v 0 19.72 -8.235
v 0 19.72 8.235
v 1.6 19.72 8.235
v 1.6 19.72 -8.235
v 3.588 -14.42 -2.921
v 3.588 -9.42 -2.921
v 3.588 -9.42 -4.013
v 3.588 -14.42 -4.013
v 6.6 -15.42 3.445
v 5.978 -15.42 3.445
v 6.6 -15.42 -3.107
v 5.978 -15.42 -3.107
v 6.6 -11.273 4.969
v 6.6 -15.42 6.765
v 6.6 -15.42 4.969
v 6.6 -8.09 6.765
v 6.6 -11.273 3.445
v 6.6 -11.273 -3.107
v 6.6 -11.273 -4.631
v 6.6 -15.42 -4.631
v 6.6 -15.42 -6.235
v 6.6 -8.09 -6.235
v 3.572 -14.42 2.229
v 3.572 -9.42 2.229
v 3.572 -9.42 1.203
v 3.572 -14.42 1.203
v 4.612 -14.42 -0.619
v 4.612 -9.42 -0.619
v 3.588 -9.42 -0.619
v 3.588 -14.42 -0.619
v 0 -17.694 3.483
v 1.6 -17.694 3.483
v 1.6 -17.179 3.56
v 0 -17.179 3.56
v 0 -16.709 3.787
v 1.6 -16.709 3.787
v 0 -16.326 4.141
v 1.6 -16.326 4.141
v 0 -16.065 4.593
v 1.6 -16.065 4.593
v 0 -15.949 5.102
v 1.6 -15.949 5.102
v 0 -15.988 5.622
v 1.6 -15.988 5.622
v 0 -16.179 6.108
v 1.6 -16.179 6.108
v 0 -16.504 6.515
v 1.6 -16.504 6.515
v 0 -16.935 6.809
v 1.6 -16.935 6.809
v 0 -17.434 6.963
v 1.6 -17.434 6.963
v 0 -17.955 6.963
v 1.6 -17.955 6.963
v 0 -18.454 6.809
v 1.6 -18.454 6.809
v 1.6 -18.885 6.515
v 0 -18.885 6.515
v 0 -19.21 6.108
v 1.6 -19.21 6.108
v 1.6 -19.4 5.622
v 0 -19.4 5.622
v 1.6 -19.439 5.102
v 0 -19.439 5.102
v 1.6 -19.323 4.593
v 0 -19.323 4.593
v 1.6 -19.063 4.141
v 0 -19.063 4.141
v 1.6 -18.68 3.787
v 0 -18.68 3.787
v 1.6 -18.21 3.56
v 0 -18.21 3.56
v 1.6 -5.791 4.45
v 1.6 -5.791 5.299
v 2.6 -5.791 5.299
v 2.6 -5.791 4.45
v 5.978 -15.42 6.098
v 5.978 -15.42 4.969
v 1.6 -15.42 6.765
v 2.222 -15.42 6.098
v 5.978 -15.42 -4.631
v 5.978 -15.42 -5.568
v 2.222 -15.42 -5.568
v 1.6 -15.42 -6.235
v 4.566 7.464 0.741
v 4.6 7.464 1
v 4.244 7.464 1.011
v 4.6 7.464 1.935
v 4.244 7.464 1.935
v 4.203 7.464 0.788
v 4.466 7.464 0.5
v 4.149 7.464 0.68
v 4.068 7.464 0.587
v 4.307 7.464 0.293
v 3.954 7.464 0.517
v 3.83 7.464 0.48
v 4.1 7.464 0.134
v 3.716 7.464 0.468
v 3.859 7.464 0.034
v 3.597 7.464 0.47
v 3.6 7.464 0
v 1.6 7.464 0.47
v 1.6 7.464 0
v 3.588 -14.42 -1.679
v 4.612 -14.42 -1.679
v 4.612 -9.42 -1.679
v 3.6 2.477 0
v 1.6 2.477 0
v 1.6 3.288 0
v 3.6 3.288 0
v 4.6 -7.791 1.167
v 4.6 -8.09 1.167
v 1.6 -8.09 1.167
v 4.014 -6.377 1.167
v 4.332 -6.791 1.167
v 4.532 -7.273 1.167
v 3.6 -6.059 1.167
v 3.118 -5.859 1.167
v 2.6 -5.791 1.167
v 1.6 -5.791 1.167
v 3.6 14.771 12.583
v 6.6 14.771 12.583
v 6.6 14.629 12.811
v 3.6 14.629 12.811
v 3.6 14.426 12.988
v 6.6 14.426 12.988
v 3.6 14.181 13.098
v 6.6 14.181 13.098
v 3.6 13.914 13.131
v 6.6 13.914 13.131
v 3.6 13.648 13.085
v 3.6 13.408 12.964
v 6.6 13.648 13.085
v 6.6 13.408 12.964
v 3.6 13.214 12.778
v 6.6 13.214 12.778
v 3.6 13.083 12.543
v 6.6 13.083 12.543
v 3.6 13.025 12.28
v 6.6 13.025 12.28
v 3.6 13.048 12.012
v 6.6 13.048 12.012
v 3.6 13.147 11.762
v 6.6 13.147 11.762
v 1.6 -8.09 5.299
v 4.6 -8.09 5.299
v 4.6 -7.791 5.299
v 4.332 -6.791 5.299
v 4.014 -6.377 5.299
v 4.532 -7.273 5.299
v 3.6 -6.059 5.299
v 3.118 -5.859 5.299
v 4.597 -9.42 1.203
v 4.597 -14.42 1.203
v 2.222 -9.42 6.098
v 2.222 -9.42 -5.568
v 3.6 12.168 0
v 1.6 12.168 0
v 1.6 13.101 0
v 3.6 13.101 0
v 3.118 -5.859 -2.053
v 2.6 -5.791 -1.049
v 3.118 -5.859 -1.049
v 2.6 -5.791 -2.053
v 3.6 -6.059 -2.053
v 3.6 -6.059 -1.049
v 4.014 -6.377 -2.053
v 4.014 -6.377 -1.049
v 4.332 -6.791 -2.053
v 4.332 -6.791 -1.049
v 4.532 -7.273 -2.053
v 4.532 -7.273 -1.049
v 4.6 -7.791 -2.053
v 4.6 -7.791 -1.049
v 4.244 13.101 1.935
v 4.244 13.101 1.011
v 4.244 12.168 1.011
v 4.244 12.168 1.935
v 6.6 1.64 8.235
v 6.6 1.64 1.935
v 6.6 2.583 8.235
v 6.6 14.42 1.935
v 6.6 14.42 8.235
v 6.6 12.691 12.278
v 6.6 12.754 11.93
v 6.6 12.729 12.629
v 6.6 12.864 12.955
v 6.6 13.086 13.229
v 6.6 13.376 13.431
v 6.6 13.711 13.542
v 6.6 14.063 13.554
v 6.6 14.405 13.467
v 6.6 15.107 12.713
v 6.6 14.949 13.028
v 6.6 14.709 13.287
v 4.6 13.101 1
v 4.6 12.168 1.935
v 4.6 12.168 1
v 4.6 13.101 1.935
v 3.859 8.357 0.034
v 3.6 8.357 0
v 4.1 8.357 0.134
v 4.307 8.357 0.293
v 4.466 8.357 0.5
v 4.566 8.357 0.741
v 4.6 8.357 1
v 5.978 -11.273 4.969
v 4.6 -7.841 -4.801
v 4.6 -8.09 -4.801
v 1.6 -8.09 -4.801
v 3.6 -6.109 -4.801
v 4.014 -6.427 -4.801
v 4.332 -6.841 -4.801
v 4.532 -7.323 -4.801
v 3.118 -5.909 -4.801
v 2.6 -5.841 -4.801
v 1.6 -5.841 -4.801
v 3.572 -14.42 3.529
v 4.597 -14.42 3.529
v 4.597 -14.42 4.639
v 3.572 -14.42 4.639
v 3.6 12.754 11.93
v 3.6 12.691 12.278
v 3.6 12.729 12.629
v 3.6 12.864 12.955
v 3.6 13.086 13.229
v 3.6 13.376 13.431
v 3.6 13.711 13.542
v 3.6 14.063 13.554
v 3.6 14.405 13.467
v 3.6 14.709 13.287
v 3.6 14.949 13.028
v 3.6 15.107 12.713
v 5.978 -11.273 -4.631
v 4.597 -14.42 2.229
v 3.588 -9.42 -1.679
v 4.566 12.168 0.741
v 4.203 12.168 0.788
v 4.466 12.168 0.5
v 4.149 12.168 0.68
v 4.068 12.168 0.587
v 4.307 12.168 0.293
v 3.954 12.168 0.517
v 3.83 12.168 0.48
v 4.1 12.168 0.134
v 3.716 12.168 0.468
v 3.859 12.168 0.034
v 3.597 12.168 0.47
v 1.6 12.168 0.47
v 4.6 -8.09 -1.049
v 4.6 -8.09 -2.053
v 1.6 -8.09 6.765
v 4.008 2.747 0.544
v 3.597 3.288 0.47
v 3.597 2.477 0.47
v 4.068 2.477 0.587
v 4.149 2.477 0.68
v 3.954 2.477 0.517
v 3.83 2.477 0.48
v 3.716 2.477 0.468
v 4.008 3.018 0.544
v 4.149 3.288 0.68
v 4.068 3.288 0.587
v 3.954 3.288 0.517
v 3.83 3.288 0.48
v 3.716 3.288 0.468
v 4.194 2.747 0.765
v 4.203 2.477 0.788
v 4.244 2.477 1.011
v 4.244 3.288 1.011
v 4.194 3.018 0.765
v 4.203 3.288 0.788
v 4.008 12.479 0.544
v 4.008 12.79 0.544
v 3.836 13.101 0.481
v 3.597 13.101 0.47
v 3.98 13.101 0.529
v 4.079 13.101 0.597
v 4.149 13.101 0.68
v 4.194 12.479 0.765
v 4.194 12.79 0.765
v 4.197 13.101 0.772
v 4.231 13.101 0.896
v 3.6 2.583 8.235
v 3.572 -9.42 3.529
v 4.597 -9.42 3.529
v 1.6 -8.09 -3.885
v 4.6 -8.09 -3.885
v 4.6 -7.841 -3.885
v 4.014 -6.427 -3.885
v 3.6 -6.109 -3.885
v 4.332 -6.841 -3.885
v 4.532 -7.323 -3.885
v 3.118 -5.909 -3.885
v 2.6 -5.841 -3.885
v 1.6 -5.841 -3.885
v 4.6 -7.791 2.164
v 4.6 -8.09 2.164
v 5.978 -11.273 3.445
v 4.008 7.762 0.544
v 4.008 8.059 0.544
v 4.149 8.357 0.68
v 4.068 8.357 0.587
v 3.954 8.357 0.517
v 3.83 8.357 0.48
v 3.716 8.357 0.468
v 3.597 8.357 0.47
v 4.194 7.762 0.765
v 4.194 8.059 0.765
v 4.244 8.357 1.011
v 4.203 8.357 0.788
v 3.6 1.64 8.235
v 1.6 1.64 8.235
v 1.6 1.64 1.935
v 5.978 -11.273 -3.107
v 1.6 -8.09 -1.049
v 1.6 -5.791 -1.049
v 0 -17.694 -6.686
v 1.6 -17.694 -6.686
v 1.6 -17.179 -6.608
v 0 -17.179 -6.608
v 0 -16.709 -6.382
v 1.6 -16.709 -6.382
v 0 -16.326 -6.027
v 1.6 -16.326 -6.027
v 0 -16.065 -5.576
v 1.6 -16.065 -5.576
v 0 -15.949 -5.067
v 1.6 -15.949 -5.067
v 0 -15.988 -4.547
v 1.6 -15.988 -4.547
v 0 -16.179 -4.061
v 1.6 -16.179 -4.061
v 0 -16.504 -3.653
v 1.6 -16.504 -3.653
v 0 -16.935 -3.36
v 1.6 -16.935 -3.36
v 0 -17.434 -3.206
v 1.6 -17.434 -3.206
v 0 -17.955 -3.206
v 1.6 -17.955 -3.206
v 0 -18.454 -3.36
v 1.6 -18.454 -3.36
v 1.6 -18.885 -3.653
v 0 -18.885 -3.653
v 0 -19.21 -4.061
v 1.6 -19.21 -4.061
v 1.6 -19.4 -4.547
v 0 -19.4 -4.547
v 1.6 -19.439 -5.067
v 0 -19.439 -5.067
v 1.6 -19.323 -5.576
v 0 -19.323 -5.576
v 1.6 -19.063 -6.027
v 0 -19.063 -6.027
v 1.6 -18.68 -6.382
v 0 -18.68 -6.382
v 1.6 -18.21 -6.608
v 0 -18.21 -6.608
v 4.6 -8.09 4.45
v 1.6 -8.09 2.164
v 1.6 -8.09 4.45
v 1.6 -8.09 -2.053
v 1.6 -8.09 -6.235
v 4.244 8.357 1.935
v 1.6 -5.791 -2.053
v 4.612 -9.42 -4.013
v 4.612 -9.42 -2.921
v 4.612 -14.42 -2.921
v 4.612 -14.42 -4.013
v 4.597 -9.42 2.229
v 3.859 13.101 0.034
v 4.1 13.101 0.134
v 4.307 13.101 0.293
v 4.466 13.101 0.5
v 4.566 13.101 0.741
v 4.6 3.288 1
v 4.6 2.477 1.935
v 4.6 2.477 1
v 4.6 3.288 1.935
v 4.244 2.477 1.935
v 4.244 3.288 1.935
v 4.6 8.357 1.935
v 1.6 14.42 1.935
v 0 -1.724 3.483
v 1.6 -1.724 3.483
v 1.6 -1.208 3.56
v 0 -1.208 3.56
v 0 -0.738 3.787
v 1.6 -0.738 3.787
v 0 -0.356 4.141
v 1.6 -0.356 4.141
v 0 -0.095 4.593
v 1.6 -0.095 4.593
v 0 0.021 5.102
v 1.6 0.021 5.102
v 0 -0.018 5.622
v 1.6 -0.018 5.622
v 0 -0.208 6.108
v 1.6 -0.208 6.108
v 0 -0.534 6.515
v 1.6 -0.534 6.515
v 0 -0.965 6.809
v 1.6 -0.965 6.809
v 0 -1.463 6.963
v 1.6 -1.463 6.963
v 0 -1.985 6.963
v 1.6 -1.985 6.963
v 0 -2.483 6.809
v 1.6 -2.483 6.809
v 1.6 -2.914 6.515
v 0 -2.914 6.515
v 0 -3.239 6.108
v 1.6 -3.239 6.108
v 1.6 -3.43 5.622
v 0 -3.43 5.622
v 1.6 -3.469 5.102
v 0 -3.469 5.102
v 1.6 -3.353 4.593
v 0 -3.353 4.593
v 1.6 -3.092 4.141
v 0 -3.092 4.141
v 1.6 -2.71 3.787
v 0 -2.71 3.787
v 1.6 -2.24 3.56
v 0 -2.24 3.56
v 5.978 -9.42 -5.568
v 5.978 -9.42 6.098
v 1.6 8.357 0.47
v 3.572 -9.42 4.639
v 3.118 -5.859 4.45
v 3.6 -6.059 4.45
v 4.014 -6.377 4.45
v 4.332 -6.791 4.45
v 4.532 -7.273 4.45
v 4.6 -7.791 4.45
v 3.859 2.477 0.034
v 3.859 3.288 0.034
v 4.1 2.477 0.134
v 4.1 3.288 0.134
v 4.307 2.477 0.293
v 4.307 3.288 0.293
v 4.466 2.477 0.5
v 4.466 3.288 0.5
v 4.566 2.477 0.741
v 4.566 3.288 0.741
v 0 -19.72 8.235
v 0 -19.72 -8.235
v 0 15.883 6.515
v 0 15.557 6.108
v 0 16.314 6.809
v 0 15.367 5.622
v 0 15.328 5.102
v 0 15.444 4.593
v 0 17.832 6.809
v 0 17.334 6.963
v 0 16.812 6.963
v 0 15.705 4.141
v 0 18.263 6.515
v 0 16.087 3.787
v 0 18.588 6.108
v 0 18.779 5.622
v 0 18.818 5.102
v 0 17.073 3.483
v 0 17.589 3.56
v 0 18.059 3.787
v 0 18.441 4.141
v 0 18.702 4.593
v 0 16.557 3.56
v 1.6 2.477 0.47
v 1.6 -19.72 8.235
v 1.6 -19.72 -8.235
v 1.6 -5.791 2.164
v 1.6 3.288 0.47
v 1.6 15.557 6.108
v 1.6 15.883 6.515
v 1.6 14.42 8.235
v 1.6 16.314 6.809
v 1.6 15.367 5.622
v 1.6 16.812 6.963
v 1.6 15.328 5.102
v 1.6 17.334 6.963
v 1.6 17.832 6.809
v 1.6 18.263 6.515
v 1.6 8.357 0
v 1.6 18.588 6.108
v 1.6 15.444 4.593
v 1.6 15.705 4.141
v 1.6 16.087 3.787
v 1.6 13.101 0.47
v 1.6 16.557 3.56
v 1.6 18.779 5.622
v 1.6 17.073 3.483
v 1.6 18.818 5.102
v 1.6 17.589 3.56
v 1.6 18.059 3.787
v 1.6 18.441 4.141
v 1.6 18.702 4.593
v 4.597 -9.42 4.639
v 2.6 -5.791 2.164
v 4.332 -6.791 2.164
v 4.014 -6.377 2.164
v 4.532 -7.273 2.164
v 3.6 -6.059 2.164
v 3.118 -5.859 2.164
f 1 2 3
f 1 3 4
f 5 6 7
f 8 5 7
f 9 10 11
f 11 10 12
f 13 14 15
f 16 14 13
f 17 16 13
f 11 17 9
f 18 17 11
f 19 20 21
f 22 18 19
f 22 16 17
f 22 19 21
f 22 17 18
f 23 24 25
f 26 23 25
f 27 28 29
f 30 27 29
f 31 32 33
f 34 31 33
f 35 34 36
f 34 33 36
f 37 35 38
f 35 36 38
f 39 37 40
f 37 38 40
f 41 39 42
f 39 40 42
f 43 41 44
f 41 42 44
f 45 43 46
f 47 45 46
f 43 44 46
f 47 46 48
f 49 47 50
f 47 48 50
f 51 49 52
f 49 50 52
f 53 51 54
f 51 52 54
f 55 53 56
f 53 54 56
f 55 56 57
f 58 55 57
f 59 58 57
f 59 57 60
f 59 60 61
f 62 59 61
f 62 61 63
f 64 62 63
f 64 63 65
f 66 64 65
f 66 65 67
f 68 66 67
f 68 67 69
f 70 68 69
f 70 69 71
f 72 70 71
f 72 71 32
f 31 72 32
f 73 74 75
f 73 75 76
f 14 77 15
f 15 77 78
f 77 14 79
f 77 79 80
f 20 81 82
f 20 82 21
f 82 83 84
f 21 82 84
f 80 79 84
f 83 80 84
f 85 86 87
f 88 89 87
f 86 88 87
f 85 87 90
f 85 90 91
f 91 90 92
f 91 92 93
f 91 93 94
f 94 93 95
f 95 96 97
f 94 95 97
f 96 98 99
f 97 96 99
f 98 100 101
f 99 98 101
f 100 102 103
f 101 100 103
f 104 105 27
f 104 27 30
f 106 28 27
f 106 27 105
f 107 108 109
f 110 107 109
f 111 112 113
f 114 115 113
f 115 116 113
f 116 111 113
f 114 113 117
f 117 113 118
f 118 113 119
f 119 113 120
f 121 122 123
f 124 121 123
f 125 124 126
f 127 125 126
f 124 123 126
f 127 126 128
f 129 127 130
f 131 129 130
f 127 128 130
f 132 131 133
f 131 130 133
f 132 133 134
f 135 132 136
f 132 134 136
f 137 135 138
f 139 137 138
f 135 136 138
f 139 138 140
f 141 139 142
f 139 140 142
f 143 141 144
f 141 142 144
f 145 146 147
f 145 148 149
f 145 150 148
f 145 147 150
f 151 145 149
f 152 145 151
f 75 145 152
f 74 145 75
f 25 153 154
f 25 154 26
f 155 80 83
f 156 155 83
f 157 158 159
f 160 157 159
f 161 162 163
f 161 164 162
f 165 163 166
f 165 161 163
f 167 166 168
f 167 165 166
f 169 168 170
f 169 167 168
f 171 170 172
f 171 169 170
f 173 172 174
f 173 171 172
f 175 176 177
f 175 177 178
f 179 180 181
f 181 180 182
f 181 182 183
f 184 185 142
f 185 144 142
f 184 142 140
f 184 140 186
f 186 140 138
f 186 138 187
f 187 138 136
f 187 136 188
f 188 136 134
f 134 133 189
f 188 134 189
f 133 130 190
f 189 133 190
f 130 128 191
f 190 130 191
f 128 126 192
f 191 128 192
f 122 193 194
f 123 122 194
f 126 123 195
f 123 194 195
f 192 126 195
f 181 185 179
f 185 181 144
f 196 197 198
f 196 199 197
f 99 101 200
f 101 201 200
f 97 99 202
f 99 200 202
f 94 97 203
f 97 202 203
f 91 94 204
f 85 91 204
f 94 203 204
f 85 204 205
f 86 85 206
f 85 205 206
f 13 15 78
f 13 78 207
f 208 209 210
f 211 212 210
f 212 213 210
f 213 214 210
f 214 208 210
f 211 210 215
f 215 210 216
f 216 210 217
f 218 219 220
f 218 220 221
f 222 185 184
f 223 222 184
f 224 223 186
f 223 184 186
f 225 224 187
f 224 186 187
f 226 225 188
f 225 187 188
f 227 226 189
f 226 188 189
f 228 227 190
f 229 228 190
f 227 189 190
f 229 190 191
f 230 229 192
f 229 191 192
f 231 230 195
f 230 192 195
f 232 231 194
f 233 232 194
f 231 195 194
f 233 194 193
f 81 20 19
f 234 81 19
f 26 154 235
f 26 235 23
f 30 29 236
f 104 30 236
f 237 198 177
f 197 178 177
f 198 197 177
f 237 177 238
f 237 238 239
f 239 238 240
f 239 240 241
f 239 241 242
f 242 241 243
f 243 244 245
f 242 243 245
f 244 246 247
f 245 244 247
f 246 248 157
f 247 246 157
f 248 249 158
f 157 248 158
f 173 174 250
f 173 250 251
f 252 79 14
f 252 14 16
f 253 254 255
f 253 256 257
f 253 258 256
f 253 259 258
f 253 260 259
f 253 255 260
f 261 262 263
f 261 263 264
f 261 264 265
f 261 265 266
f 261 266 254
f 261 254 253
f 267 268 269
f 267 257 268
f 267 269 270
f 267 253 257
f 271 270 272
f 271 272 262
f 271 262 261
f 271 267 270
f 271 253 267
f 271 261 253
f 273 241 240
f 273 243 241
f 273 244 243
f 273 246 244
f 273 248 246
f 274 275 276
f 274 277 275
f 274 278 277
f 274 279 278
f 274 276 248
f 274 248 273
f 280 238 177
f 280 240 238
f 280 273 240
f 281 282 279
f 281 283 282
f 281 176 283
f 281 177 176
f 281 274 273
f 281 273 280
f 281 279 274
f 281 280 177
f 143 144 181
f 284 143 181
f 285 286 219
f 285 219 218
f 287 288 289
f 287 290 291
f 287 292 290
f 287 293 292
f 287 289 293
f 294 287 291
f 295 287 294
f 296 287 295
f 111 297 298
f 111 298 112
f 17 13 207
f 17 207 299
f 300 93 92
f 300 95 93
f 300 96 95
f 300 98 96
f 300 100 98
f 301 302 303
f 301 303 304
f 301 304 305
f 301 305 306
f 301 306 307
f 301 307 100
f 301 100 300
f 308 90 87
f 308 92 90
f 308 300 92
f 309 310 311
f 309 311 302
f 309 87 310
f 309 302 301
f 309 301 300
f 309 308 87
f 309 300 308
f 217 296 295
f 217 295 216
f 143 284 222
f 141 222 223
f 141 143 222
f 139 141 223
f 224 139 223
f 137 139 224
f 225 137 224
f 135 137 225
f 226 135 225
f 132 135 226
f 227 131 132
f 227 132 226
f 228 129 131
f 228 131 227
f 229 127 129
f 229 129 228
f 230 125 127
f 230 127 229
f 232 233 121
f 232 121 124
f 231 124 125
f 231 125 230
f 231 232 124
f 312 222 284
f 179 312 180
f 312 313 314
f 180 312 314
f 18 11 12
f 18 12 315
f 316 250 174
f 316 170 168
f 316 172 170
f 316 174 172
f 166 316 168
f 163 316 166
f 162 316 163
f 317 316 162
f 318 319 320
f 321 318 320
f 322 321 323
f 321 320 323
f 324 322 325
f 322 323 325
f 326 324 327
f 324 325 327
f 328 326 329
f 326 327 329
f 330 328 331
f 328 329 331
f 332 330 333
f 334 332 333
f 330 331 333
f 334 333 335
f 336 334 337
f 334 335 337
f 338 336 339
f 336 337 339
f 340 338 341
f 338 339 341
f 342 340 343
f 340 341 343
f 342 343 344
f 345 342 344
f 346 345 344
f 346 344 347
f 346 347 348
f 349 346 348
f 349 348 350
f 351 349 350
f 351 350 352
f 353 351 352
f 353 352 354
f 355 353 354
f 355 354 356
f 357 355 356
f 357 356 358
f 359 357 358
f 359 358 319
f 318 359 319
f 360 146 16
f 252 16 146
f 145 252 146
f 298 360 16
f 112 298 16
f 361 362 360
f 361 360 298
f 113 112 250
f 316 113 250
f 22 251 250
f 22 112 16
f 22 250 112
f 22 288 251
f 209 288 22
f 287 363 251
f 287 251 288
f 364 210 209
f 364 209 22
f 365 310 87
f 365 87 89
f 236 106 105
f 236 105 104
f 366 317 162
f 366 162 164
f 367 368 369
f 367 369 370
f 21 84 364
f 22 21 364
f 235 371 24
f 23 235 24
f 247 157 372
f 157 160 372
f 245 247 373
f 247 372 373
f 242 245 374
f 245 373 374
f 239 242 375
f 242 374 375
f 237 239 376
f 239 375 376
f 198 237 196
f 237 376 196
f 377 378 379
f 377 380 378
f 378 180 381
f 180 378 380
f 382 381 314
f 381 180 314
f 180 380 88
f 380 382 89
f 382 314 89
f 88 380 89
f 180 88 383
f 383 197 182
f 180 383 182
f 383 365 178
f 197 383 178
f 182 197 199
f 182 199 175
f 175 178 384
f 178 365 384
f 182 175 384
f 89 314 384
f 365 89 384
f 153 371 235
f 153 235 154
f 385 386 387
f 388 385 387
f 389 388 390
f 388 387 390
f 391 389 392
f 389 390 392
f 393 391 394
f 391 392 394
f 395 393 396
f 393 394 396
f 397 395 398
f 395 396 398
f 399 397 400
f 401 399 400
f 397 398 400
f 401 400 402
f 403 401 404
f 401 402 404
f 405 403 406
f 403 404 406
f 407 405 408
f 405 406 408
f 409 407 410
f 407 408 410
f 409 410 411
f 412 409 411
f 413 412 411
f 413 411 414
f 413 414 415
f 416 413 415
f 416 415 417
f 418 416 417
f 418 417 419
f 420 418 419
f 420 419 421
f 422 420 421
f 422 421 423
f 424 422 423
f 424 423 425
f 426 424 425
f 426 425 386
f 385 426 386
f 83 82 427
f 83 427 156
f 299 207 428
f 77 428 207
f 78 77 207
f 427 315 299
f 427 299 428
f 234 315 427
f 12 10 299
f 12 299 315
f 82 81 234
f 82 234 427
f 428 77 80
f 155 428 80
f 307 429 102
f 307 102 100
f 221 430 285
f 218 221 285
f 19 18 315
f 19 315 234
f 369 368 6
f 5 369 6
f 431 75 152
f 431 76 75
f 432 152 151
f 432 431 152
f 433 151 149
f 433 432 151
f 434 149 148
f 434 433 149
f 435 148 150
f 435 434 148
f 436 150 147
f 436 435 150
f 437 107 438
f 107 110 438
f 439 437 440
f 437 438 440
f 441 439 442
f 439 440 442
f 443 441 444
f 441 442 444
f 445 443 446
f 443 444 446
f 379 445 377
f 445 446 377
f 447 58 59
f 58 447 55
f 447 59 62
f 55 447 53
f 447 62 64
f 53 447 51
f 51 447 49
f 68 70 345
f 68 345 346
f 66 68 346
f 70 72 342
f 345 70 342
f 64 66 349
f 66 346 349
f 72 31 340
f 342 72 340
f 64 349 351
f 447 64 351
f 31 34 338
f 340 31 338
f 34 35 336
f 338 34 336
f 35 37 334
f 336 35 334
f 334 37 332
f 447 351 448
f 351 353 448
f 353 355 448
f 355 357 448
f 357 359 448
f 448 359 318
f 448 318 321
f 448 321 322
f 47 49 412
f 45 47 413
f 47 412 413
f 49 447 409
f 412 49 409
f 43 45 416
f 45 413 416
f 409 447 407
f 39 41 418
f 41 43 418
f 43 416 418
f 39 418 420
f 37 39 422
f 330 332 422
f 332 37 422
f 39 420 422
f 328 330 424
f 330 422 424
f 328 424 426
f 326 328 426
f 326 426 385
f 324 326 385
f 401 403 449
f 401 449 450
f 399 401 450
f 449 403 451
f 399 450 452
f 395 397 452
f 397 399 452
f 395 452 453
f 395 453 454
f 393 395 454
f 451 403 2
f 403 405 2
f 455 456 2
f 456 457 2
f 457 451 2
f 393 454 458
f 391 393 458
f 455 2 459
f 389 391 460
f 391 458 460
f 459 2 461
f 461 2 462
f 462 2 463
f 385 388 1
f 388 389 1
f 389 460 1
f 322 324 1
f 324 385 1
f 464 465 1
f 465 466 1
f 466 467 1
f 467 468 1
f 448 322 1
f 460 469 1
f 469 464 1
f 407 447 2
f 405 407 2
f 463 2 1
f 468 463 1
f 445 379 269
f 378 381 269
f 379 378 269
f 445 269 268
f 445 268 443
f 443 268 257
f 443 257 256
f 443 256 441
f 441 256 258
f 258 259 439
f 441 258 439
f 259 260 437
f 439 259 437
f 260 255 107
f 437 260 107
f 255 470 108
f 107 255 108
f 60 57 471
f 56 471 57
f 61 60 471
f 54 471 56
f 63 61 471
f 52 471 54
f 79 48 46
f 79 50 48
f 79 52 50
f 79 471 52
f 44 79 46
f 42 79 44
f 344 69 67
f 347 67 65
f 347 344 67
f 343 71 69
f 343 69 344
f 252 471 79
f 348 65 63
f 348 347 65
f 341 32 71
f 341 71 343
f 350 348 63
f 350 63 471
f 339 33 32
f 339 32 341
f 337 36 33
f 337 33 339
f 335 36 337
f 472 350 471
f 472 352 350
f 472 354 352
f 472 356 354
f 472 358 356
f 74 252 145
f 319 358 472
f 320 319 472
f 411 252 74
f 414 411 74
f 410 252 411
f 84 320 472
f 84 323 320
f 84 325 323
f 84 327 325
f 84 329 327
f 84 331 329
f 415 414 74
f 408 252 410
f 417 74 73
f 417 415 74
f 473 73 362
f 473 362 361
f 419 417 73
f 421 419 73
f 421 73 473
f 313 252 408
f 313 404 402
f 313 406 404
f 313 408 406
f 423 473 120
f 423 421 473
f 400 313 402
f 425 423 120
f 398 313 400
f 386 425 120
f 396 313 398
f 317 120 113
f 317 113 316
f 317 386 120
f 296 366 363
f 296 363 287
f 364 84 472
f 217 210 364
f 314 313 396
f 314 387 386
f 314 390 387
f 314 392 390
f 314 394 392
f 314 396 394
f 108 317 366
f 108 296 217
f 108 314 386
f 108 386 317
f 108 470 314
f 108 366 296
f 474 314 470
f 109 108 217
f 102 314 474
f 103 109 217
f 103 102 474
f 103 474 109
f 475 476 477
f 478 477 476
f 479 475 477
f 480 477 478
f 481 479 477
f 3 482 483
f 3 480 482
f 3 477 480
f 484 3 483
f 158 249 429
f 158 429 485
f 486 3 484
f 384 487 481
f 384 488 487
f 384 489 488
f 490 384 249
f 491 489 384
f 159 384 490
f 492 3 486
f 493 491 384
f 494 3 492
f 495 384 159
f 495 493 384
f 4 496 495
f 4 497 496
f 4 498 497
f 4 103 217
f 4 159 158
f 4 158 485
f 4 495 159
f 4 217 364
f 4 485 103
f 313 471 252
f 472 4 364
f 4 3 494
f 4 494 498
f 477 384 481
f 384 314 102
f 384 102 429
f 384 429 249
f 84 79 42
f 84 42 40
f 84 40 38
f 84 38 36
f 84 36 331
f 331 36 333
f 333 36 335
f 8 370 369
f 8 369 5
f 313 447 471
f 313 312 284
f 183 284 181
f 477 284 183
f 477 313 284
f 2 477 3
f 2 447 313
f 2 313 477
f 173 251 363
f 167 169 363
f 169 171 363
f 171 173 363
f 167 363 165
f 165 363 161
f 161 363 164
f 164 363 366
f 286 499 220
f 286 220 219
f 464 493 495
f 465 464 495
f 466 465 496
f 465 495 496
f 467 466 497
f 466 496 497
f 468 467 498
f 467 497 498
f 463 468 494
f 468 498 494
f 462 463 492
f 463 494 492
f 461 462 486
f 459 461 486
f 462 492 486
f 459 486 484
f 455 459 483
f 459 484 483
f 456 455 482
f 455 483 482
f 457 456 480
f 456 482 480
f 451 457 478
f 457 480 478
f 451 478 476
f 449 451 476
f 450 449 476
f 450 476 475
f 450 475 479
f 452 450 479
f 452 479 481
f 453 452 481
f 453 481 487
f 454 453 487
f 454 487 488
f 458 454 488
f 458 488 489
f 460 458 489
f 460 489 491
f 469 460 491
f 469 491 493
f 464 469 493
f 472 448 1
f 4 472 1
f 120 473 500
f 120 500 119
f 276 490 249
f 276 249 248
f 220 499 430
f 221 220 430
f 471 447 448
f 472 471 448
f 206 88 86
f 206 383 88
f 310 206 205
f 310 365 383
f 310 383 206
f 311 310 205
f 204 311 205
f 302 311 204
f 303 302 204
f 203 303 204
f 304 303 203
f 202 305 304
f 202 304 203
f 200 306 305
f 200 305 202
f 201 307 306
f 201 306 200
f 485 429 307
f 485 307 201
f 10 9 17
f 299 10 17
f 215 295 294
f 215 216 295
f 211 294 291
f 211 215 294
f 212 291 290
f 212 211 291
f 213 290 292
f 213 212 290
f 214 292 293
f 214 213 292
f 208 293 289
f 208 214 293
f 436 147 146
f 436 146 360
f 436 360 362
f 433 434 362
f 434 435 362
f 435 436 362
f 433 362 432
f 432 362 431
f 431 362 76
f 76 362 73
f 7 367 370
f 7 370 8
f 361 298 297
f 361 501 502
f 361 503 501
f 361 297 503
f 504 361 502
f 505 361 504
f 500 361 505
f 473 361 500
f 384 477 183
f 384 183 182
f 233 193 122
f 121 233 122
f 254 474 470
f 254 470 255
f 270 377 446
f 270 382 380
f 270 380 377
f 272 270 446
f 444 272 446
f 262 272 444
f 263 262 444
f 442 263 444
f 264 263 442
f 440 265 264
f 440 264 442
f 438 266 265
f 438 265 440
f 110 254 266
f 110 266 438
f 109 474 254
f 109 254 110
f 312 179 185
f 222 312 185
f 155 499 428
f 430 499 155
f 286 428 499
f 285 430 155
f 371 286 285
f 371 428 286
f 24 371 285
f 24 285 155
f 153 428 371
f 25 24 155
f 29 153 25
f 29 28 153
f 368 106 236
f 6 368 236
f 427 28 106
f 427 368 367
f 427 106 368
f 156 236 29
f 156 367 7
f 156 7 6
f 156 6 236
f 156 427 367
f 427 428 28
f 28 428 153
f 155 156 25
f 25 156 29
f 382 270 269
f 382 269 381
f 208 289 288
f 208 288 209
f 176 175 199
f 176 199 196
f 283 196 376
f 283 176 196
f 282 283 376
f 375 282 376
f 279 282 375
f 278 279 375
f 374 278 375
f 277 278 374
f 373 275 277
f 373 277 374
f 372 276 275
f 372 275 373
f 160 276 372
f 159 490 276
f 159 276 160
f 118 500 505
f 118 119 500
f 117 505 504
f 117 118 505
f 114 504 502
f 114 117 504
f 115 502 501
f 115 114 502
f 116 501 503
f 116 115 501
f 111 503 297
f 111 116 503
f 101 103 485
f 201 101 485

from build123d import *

# Parameters (mm, degrees)
SKETCH1_W           = 16.47
SKETCH1_H           = 39.44
BOSS_EXTRUDE1_DEPTH = 1.6
SKETCH2_W           = 6.3
SKETCH2_H           = 12.78
BOSS_EXTRUDE2_DEPTH = 5
SKETCH3_W           = 13
SKETCH3_H           = 7.33
BOSS_EXTRUDE3_DEPTH = 5
SKETCH4_W           = 0.849222168
SKETCH4_H           = 2.299281869
SKETCH4_W_2         = 0.996668432
SKETCH4_W_3         = 1.004572576
SKETCH4_W_4         = 0.915933819
SKETCH4_H_2         = 2.249002208
BOSS_EXTRUDE4_DEPTH = 3
SKETCH5_W           = 3.755878466
SKETCH5_H           = 11.665306642
CUT_EXTRUDE1_DEPTH  = 6
FILLET2_R           = 2
SKETCH6_W           = 1.024991321
SKETCH6_H           = 1.10945112
SKETCH6_H_2         = 1.02665626
SKETCH6_W_2         = 1.024991322
SKETCH6_H_3         = 1.059774204
SKETCH6_H_4         = 1.092892148
BOSS_EXTRUDE5_DEPTH = 5
SKETCH7_W           = 1.524548779
SKETCH7_H           = 4.1468753
CUT_EXTRUDE2_DEPTH  = 1
SKETCH8_W           = 1.935
SKETCH8_H           = 0.932620141
SKETCH8_H_2         = 0.892071439
SKETCH8_H_3         = 0.810974035
BOSS_EXTRUDE6_DEPTH = 3
FILLET3_R           = 1
CUT_EXTRUDE3_DEPTH  = 11
SKETCH10_R          = 1.75
CUT_EXTRUDE4_DEPTH  = 11
BOSS_EXTRUDE7_DEPTH = 3


with BuildPart() as part:
    # Sketch1 → Boss-Extrude1 (new body)
    with BuildSketch(Plane(origin=(0, 0, 0), x_dir=(0, 0, -1), z_dir=(1, 0, 0))):
        Rectangle(SKETCH1_W, SKETCH1_H)
    extrude(amount=BOSS_EXTRUDE1_DEPTH)

    # Sketch2 → Boss-Extrude2 (add)
    with BuildSketch(Plane(origin=(1.6, 0, 0), x_dir=(0, 0, -1), z_dir=(1, 0, 0))):
        with Locations((-5.085, 8.03)):
            Rectangle(SKETCH2_W, SKETCH2_H)
    extrude(amount=BOSS_EXTRUDE2_DEPTH)

    # Sketch3 → Boss-Extrude3 (add)
    with BuildSketch(Plane(origin=(1.6, 0, 0), x_dir=(0, 0, -1), z_dir=(1, 0, 0))):
        with Locations((-0.265, -11.755)):
            Rectangle(SKETCH3_W, SKETCH3_H)
    extrude(amount=BOSS_EXTRUDE3_DEPTH)

    # Sketch4 → Boss-Extrude4 (add)
    with BuildSketch(Plane(origin=(1.6, 0, 0), x_dir=(0, 0, -1), z_dir=(1, 0, 0))):
        with Locations((-4.874772316, -6.940359066)):
            Rectangle(SKETCH4_W, SKETCH4_H)
        with Locations((-1.665459639, -6.940359066)):
            Rectangle(SKETCH4_W_2, SKETCH4_H)
        with Locations((1.551129782, -6.940359066)):
            Rectangle(SKETCH4_W_3, SKETCH4_H)
        with Locations((4.343250619, -6.965498896)):
            Rectangle(SKETCH4_W_4, SKETCH4_H_2)
    extrude(amount=BOSS_EXTRUDE4_DEPTH)

    # Sketch5 → Cut-Extrude1 (cut)
    with BuildSketch(Plane(origin=(0, -15.42, 0), x_dir=(-1, 0, 0), z_dir=(0, -1, 0))):
        with Locations((-4.1, -0.265)):
            Rectangle(SKETCH5_W, SKETCH5_H)
    extrude(amount=-CUT_EXTRUDE1_DEPTH, mode=Mode.SUBTRACT)

    # Fillet2
    fillet2_edges = [part.edges().sort_by_distance(p)[0] for p in [
        (4.6, -5.790718131, 4.874772316),
        (4.6, -5.790718131, 1.665459639),
        (4.6, -5.790718131, -1.551129782),
        (4.6, -5.840997792, -4.343250618),
    ]]
    fillet(fillet2_edges, radius=FILLET2_R)

    # Sketch6 → Boss-Extrude5 (add)
    with BuildSketch(Plane(origin=(0, -9.42, 0), x_dir=(-1, 0, 0), z_dir=(0, -1, 0))):
        with Locations((-4.084273497, -4.083852883)):
            Rectangle(SKETCH6_W, SKETCH6_H)
        with Locations((-4.084273497, -1.715919896)):
            Rectangle(SKETCH6_W, SKETCH6_H_2)
        with Locations((-4.1, 1.14878225)):
            Rectangle(SKETCH6_W_2, SKETCH6_H_3)
        with Locations((-4.1, 3.467038322)):
            Rectangle(SKETCH6_W_2, SKETCH6_H_4)
    extrude(amount=BOSS_EXTRUDE5_DEPTH)

    # Sketch7 → Cut-Extrude2 (cut)
    with BuildSketch(Plane(origin=(6.6, 0, 0), x_dir=(0, 0, -1), z_dir=(1, 0, 0))):
        with Locations((-4.207178808, -13.34656235)):
            Rectangle(SKETCH7_W, SKETCH7_H)
        with Locations((3.868809321, -13.34656235)):
            Rectangle(SKETCH7_W, SKETCH7_H)
    extrude(amount=-CUT_EXTRUDE2_DEPTH, mode=Mode.SUBTRACT)

    # Sketch8 → Boss-Extrude6 (add)
    with BuildSketch(Plane(origin=(1.6, 0, 0), x_dir=(0, 0, -1), z_dir=(1, 0, 0))):
        with Locations((-0.9675, 12.634426175)):
            Rectangle(SKETCH8_W, SKETCH8_H)
        with Locations((-0.9675, 7.91050242)):
            Rectangle(SKETCH8_W, SKETCH8_H_2)
        with Locations((-0.9675, 2.8824634)):
            Rectangle(SKETCH8_W, SKETCH8_H_3)
    extrude(amount=BOSS_EXTRUDE6_DEPTH)

    # Fillet3
    fillet3_edges = [part.edges().sort_by_distance(p)[0] for p in [
        (4.6, 12.634426176, 0),
        (4.6, 7.910502419, 0),
        (4.6, 2.8824634, 0),
    ]]
    fillet(fillet3_edges, radius=FILLET3_R)

    # Sketch9 → Cut-Extrude3 (cut)
    with BuildSketch(Plane(origin=(0, 13.100736246, 0), x_dir=(1, 0, 0), z_dir=(0, 1, 0))):
        with BuildLine():
            Line((1.6, -0.469848577), (3.597144342, -0.469848577))
            add(Edge.make_bspline(
                [(3.597144342, -0.469848577), (4.148845696, -0.430996369), (4.233002481, -0.792491938), (4.243645389, -1.010671568)],
                knots=[0, 0, 0, 0, 1, 1, 1, 1], degree=3))
            Line((4.243645389, -1.010671568), (4.243645389, -1.935))
            Line((4.243645389, -1.935), (1.6, -1.935))
            Line((1.6, -1.935), (1.6, -0.469848577))
        make_face()
    extrude(amount=-CUT_EXTRUDE3_DEPTH, mode=Mode.SUBTRACT)

    # Sketch10 → Cut-Extrude4 (cut)
    with BuildSketch(Plane(origin=(1.6, 0, 0), x_dir=(0, 0, -1), z_dir=(1, 0, 0))):
        with Locations((-5.232585415, -1.723827663)):
            Circle(SKETCH10_R)
        with Locations((-5.232585415, 17.072870227)):
            Circle(SKETCH10_R)
        with Locations((-5.232585415, -17.69434278)):
            Circle(SKETCH10_R)
        with Locations((4.936201482, -17.69434278)):
            Circle(SKETCH10_R)
    extrude(amount=-CUT_EXTRUDE4_DEPTH, mode=Mode.SUBTRACT)

    # Sketch11 → Boss-Extrude7 (add)
    with BuildSketch(Plane(origin=(6.6, 0, 0), x_dir=(0, 0, -1), z_dir=(1, 0, 0))):
        with BuildLine():
            Line((-8.235, 1.64), (-11.930418499, 12.753922868))
            ThreePointArc((-11.930418499, 12.753922868), (-13.49815489, 13.539255516), (-12.712822243, 15.106991908))
            Line((-12.712822243, 15.106991908), (-12.58261695, 14.771125615))
            ThreePointArc((-12.58261695, 14.771125615), (-13.033453184, 13.523901114), (-11.761958985, 13.146906726))
            Line((-11.761958985, 13.146906726), (-8.235, 2.583341722))
            Line((-8.235, 2.583341722), (-8.235, 1.64))
        make_face()
    extrude(amount=-BOSS_EXTRUDE7_DEPTH)


solid = part.part
